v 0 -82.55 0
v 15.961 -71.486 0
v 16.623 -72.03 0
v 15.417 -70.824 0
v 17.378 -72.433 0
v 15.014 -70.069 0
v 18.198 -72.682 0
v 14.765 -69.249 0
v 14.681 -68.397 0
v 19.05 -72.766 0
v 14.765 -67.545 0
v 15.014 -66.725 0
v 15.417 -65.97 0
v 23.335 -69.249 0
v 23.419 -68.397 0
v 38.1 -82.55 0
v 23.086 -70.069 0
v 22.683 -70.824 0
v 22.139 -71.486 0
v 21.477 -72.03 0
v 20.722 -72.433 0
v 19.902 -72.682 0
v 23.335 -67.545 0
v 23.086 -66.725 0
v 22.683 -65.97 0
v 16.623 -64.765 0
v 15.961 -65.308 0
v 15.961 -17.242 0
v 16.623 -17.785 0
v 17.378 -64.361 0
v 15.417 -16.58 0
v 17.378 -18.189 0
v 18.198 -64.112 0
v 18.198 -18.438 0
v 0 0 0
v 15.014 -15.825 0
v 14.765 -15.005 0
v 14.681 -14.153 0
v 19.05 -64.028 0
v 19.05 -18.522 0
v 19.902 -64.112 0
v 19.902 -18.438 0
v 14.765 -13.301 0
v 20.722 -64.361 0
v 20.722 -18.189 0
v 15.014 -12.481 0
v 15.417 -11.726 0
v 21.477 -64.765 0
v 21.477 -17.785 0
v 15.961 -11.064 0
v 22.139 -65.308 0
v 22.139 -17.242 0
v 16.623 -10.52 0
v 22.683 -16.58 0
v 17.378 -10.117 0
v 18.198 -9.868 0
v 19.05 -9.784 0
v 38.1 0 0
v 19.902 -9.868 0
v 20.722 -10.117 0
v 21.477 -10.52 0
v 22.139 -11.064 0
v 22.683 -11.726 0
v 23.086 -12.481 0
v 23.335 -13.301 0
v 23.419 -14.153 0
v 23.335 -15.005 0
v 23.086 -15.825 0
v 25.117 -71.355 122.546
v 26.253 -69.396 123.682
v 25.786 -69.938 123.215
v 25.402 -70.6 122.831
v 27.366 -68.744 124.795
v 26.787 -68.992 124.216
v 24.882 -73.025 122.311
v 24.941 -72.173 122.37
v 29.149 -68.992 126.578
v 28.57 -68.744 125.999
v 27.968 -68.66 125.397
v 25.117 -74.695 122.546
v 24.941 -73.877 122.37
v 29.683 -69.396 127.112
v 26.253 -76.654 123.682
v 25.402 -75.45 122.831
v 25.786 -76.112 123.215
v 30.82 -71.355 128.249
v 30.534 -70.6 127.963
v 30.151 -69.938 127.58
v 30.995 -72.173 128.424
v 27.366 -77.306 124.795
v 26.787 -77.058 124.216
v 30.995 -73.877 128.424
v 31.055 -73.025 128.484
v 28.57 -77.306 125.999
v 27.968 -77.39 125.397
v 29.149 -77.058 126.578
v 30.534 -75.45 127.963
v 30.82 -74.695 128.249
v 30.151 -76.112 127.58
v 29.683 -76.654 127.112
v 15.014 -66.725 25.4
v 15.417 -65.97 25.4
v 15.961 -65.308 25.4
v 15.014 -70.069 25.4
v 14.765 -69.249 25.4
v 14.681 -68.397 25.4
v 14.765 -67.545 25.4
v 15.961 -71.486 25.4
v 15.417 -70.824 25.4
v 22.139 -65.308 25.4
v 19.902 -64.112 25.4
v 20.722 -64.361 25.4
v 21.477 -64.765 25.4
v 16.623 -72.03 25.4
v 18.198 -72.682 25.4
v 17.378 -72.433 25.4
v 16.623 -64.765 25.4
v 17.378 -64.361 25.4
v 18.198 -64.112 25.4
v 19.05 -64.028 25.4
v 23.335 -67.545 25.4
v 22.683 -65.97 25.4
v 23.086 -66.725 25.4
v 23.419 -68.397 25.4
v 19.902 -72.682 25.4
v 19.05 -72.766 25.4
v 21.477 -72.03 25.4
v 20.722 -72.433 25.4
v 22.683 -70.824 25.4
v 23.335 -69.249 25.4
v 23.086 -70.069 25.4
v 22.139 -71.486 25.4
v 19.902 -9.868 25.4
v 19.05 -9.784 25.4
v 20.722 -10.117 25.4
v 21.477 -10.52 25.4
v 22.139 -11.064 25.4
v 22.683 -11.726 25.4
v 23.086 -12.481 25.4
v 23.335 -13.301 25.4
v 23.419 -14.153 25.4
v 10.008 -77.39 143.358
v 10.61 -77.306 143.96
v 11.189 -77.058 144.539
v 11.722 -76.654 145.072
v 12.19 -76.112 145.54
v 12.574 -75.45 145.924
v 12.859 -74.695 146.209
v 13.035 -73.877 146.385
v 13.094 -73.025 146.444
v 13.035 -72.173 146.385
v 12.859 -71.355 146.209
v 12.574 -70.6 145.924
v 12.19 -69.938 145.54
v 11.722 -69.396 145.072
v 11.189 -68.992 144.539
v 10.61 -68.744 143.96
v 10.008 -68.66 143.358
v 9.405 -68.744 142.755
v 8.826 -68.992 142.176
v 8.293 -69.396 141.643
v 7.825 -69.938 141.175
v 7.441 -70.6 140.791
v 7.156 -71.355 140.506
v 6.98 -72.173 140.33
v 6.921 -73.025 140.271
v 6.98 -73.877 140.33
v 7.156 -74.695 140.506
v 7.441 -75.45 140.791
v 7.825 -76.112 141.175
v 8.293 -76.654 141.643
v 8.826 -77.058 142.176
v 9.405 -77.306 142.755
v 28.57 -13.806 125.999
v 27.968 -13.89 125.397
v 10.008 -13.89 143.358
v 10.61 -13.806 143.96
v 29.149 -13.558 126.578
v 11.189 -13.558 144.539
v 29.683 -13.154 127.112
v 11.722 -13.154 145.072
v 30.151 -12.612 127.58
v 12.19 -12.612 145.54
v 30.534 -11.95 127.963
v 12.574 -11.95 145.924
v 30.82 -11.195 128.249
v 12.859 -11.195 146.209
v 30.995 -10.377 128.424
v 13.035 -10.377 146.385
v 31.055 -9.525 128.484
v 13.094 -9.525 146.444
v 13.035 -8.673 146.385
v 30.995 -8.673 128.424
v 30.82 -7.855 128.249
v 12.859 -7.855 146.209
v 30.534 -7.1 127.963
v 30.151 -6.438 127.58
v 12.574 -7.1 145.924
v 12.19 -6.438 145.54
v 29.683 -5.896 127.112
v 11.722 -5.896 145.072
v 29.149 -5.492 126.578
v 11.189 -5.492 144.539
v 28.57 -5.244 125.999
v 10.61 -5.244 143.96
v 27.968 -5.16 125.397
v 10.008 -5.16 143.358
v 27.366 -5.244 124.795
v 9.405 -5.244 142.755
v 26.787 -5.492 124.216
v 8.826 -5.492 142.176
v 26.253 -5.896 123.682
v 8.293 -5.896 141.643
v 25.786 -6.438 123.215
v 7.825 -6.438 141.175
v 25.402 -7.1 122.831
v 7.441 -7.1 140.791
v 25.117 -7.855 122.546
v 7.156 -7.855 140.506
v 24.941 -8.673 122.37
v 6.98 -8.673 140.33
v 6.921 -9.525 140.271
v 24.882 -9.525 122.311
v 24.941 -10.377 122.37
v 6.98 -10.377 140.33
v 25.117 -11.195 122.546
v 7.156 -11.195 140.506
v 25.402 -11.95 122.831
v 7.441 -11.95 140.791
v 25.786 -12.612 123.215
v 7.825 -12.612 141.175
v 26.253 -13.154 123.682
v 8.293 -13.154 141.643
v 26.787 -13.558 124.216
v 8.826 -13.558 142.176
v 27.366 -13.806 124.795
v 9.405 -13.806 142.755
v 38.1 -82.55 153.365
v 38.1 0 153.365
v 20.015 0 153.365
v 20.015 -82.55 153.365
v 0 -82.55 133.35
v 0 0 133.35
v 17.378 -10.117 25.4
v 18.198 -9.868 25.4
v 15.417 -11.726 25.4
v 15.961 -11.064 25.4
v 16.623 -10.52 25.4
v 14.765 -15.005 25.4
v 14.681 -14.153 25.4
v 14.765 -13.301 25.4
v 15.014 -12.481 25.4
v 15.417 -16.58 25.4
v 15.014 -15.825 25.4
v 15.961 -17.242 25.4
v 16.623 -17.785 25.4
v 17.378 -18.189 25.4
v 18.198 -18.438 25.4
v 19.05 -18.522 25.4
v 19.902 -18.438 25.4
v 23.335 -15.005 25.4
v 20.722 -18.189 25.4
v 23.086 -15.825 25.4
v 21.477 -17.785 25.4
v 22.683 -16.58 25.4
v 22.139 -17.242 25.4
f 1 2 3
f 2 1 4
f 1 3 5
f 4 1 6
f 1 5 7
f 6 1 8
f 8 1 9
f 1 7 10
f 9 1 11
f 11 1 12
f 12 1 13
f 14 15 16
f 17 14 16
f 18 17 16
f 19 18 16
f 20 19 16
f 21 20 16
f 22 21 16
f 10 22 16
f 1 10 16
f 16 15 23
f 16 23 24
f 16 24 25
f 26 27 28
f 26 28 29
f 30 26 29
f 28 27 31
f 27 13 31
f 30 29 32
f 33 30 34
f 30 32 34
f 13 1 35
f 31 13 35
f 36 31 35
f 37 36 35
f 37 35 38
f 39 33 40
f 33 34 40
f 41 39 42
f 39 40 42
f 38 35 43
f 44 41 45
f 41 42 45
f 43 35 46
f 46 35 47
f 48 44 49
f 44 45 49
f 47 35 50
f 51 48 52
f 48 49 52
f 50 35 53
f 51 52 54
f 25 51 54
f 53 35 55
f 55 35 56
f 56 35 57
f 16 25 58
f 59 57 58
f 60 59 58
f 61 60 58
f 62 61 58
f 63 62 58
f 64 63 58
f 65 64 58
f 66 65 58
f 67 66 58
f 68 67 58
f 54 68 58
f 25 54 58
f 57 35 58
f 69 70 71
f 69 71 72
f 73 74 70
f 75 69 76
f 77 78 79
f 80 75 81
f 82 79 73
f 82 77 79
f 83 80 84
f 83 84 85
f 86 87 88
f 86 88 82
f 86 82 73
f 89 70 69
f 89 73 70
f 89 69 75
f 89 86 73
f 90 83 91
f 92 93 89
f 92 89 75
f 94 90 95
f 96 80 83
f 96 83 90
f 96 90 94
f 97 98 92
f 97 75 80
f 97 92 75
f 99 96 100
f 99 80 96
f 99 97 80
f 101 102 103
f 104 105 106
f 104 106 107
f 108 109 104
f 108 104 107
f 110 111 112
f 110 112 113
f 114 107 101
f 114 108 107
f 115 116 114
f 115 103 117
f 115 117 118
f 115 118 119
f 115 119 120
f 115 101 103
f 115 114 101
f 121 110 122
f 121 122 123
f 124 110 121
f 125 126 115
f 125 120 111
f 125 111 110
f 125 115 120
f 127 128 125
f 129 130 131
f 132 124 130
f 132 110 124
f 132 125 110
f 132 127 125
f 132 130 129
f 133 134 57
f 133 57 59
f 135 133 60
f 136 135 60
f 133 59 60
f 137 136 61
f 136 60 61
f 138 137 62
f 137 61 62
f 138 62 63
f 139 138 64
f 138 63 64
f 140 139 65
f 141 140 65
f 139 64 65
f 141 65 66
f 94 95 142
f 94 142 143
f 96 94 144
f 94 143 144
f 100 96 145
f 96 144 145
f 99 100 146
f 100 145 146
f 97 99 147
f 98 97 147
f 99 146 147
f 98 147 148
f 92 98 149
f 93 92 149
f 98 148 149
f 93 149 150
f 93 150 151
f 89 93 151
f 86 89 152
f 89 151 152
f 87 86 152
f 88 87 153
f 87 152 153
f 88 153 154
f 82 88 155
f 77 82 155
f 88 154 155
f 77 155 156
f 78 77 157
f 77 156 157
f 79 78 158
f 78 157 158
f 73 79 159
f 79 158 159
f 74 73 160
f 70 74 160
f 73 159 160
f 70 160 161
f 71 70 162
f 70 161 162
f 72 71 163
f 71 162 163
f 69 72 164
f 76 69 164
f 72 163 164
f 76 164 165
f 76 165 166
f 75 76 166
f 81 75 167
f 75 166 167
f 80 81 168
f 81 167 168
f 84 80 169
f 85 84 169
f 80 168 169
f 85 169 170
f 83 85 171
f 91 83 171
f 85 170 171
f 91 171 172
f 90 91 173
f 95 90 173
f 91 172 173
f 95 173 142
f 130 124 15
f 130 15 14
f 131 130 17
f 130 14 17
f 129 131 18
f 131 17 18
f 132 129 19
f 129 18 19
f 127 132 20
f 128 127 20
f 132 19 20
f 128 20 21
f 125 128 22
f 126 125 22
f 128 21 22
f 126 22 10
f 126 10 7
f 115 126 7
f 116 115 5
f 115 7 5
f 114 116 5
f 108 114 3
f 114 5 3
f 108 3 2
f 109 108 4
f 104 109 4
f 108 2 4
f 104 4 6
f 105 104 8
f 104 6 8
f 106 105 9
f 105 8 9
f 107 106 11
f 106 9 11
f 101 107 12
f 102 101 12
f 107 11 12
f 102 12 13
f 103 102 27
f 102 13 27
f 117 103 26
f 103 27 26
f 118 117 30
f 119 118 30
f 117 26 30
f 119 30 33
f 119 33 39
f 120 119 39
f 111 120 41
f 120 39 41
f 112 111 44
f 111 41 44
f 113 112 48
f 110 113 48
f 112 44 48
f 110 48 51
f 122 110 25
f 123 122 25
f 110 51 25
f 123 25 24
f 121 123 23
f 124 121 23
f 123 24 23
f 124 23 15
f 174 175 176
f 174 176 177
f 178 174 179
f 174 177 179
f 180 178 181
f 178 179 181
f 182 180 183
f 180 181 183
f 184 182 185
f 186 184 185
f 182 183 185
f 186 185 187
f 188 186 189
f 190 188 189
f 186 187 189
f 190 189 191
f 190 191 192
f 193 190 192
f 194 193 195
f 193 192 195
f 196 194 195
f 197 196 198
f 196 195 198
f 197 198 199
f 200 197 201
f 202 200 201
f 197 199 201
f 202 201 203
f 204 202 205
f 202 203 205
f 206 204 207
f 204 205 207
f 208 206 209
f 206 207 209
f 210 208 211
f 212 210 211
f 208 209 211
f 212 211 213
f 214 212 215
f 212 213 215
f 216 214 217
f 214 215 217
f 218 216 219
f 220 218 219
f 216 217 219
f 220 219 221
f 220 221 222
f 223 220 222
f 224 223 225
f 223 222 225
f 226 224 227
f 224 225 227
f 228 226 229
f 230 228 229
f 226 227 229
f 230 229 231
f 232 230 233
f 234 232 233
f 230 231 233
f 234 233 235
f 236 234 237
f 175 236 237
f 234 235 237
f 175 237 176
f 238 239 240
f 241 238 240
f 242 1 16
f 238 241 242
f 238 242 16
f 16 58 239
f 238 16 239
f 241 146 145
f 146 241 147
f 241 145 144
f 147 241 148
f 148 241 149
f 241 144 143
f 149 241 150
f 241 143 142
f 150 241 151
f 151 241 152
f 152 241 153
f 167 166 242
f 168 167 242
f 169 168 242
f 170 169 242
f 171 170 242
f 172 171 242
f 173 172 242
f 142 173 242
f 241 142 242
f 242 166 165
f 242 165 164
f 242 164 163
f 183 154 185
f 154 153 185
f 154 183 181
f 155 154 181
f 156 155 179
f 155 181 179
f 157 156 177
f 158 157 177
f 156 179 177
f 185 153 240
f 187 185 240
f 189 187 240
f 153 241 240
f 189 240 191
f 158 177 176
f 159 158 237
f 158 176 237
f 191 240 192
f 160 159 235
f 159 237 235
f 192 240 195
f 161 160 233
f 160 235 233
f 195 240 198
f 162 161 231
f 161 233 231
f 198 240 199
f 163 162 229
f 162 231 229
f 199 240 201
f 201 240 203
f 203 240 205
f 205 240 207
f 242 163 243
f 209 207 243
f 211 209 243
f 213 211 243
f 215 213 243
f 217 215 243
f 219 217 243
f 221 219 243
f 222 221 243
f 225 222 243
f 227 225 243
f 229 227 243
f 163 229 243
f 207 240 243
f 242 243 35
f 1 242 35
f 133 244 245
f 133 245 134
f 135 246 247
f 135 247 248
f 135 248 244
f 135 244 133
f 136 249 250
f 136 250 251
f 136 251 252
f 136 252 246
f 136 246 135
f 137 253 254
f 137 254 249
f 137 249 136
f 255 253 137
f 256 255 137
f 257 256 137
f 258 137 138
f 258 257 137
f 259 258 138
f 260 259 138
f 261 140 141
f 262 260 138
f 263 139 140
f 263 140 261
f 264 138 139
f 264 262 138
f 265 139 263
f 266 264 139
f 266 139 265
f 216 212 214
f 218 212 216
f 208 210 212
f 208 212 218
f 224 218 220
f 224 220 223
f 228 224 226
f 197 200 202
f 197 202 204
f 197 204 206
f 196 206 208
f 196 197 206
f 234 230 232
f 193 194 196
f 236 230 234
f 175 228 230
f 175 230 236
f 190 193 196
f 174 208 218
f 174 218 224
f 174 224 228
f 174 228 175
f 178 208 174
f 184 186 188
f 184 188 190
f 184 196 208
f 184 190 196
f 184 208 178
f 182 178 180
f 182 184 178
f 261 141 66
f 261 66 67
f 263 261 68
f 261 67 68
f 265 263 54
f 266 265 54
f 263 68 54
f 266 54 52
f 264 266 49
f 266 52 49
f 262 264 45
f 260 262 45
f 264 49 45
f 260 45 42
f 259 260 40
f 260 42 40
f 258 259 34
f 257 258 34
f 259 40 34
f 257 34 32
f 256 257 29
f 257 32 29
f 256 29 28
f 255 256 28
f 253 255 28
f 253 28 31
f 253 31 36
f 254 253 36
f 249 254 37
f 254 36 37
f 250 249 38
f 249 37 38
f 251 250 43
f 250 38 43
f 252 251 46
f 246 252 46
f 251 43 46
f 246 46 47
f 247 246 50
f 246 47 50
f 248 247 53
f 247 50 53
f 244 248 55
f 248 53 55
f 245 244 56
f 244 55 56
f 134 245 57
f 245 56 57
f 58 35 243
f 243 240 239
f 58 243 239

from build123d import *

# Parameters (mm, degrees)
F1_DEPTH = 82.55
F2_R     = 4.36499
F3_DEPTH = 25.4
F4_R     = 4.3688
F5_DEPTH = 25.4


with BuildPart() as f1:
    # F0 (on Front) → F1 (new body)
    with BuildSketch(Plane.XZ):
        Polygon((0, 133.35), (0, 0), (38.1, 0), (38.1, 153.3652), (20.0152, 153.3652), align=None)
    extrude(amount=F1_DEPTH)

    # F2 (on face) → F3 (cut)
    with BuildSketch(Plane(origin=(-66.675, 0, 66.675), x_dir=(0, -1, 0), z_dir=(-0.707107, 0, 0.707107))):
        with Locations((9.525, 108.445573)):
            Circle(F2_R)
        with Locations((73.025, 108.445573)):
            Circle(F2_R)
    extrude(amount=-F3_DEPTH, mode=Mode.SUBTRACT)

    # F4 (on face) → F5 (cut)
    with BuildSketch(Plane(origin=(0, 0, 0), x_dir=(1, 0, 0), z_dir=(0, 0, -1))):
        with BuildLine():
            ThreePointArc((23.4188, 14.15288), (15.960792, 17.242088), (19.05, 9.78408))
            ThreePointArc((19.05, 9.78408), (22.139208, 11.063672), (23.4188, 14.15288))
        make_face()
        with Locations((19.05, 68.39712)):
            Circle(F4_R)
    extrude(amount=-F5_DEPTH, mode=Mode.SUBTRACT)


solid = f1.part
